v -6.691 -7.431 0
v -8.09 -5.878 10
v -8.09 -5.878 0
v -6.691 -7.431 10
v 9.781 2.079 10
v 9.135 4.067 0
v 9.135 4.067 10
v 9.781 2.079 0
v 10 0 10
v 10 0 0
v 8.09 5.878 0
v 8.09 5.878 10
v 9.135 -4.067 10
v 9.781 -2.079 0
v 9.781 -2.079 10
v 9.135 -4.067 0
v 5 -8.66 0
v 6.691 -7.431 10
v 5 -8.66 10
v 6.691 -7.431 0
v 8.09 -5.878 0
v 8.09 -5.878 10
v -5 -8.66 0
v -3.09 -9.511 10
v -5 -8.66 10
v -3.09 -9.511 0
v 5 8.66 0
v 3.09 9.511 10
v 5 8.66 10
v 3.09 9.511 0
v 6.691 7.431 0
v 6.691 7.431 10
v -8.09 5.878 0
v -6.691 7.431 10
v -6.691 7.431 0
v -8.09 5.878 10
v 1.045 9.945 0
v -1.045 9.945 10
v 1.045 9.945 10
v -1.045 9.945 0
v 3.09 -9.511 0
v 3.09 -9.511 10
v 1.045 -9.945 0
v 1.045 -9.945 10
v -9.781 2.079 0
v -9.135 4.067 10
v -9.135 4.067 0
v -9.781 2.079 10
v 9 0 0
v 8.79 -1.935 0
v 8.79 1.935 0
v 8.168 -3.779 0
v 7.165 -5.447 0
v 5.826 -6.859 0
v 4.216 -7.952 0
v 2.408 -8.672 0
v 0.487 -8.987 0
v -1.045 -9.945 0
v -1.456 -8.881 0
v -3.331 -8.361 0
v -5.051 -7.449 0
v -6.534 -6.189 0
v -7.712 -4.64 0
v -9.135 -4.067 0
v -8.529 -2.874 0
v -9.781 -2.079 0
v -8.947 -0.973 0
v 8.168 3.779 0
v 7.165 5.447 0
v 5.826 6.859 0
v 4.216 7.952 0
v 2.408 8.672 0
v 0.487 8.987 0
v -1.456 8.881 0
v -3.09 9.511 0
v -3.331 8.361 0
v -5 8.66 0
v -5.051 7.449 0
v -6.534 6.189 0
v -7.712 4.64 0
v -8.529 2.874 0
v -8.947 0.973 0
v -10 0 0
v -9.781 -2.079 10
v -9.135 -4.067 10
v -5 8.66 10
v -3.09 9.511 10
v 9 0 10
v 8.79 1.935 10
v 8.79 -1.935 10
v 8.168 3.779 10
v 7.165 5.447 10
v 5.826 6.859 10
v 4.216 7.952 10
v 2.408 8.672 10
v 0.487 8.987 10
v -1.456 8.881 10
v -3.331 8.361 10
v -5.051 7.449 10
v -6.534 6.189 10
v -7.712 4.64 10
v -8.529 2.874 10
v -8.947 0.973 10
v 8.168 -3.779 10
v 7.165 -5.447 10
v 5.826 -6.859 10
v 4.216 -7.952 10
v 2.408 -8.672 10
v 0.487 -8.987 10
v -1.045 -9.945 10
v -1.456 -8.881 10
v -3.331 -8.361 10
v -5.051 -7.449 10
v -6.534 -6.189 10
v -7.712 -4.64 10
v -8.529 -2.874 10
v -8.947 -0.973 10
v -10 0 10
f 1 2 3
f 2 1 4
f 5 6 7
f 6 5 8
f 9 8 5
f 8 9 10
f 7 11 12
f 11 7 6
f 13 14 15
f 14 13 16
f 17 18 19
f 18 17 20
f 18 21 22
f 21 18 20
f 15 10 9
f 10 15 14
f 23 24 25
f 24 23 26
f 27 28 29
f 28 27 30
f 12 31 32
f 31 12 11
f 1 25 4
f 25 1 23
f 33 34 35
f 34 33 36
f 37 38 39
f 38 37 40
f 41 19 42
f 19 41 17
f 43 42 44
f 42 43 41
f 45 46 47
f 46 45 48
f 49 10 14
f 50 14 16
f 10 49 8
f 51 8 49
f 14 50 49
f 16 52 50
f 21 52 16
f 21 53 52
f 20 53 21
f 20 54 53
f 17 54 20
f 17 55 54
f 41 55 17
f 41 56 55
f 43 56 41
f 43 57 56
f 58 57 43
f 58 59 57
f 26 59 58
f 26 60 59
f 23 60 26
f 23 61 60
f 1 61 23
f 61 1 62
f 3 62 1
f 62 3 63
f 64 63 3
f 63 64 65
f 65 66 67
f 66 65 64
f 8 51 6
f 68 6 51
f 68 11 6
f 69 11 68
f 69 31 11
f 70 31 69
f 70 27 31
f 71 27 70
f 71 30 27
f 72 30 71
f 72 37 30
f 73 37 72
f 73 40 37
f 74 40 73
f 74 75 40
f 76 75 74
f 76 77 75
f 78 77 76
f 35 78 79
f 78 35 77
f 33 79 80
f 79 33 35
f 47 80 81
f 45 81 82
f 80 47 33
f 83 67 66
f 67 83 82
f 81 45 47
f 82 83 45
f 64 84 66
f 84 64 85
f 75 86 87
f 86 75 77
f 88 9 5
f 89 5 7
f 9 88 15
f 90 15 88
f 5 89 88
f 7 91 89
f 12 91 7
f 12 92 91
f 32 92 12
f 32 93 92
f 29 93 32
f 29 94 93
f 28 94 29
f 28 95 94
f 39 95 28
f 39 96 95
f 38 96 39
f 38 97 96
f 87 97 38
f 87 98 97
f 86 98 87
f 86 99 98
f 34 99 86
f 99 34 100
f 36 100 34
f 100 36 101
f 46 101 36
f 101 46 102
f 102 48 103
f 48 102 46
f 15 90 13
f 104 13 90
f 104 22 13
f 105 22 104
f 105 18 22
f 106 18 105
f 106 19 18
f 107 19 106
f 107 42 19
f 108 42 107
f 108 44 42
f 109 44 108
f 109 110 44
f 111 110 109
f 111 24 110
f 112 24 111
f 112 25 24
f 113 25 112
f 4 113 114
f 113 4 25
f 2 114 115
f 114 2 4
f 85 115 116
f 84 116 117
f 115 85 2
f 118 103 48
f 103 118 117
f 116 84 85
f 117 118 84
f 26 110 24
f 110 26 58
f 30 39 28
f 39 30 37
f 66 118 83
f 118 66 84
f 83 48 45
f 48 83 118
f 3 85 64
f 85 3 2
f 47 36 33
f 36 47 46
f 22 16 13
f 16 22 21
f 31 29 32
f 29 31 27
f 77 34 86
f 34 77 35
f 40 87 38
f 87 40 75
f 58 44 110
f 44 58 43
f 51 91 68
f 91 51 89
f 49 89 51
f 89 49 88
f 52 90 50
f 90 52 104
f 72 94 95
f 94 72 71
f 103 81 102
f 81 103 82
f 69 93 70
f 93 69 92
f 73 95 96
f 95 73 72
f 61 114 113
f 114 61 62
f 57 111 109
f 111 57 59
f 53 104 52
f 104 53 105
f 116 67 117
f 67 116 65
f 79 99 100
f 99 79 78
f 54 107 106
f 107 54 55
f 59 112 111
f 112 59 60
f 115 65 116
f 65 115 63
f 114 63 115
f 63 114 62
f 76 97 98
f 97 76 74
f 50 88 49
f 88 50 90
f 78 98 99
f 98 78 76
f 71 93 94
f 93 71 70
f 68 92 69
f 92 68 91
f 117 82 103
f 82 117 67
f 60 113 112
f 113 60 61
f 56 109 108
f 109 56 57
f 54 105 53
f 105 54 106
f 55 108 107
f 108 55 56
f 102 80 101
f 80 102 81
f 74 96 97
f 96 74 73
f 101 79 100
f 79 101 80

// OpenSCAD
r=10;
h=10;
thick = 1;

difference() {
    cylinder(r=r,h=h);
    translate([0,0,-1]) cylinder(r=r-thick,h=h+2);
}
